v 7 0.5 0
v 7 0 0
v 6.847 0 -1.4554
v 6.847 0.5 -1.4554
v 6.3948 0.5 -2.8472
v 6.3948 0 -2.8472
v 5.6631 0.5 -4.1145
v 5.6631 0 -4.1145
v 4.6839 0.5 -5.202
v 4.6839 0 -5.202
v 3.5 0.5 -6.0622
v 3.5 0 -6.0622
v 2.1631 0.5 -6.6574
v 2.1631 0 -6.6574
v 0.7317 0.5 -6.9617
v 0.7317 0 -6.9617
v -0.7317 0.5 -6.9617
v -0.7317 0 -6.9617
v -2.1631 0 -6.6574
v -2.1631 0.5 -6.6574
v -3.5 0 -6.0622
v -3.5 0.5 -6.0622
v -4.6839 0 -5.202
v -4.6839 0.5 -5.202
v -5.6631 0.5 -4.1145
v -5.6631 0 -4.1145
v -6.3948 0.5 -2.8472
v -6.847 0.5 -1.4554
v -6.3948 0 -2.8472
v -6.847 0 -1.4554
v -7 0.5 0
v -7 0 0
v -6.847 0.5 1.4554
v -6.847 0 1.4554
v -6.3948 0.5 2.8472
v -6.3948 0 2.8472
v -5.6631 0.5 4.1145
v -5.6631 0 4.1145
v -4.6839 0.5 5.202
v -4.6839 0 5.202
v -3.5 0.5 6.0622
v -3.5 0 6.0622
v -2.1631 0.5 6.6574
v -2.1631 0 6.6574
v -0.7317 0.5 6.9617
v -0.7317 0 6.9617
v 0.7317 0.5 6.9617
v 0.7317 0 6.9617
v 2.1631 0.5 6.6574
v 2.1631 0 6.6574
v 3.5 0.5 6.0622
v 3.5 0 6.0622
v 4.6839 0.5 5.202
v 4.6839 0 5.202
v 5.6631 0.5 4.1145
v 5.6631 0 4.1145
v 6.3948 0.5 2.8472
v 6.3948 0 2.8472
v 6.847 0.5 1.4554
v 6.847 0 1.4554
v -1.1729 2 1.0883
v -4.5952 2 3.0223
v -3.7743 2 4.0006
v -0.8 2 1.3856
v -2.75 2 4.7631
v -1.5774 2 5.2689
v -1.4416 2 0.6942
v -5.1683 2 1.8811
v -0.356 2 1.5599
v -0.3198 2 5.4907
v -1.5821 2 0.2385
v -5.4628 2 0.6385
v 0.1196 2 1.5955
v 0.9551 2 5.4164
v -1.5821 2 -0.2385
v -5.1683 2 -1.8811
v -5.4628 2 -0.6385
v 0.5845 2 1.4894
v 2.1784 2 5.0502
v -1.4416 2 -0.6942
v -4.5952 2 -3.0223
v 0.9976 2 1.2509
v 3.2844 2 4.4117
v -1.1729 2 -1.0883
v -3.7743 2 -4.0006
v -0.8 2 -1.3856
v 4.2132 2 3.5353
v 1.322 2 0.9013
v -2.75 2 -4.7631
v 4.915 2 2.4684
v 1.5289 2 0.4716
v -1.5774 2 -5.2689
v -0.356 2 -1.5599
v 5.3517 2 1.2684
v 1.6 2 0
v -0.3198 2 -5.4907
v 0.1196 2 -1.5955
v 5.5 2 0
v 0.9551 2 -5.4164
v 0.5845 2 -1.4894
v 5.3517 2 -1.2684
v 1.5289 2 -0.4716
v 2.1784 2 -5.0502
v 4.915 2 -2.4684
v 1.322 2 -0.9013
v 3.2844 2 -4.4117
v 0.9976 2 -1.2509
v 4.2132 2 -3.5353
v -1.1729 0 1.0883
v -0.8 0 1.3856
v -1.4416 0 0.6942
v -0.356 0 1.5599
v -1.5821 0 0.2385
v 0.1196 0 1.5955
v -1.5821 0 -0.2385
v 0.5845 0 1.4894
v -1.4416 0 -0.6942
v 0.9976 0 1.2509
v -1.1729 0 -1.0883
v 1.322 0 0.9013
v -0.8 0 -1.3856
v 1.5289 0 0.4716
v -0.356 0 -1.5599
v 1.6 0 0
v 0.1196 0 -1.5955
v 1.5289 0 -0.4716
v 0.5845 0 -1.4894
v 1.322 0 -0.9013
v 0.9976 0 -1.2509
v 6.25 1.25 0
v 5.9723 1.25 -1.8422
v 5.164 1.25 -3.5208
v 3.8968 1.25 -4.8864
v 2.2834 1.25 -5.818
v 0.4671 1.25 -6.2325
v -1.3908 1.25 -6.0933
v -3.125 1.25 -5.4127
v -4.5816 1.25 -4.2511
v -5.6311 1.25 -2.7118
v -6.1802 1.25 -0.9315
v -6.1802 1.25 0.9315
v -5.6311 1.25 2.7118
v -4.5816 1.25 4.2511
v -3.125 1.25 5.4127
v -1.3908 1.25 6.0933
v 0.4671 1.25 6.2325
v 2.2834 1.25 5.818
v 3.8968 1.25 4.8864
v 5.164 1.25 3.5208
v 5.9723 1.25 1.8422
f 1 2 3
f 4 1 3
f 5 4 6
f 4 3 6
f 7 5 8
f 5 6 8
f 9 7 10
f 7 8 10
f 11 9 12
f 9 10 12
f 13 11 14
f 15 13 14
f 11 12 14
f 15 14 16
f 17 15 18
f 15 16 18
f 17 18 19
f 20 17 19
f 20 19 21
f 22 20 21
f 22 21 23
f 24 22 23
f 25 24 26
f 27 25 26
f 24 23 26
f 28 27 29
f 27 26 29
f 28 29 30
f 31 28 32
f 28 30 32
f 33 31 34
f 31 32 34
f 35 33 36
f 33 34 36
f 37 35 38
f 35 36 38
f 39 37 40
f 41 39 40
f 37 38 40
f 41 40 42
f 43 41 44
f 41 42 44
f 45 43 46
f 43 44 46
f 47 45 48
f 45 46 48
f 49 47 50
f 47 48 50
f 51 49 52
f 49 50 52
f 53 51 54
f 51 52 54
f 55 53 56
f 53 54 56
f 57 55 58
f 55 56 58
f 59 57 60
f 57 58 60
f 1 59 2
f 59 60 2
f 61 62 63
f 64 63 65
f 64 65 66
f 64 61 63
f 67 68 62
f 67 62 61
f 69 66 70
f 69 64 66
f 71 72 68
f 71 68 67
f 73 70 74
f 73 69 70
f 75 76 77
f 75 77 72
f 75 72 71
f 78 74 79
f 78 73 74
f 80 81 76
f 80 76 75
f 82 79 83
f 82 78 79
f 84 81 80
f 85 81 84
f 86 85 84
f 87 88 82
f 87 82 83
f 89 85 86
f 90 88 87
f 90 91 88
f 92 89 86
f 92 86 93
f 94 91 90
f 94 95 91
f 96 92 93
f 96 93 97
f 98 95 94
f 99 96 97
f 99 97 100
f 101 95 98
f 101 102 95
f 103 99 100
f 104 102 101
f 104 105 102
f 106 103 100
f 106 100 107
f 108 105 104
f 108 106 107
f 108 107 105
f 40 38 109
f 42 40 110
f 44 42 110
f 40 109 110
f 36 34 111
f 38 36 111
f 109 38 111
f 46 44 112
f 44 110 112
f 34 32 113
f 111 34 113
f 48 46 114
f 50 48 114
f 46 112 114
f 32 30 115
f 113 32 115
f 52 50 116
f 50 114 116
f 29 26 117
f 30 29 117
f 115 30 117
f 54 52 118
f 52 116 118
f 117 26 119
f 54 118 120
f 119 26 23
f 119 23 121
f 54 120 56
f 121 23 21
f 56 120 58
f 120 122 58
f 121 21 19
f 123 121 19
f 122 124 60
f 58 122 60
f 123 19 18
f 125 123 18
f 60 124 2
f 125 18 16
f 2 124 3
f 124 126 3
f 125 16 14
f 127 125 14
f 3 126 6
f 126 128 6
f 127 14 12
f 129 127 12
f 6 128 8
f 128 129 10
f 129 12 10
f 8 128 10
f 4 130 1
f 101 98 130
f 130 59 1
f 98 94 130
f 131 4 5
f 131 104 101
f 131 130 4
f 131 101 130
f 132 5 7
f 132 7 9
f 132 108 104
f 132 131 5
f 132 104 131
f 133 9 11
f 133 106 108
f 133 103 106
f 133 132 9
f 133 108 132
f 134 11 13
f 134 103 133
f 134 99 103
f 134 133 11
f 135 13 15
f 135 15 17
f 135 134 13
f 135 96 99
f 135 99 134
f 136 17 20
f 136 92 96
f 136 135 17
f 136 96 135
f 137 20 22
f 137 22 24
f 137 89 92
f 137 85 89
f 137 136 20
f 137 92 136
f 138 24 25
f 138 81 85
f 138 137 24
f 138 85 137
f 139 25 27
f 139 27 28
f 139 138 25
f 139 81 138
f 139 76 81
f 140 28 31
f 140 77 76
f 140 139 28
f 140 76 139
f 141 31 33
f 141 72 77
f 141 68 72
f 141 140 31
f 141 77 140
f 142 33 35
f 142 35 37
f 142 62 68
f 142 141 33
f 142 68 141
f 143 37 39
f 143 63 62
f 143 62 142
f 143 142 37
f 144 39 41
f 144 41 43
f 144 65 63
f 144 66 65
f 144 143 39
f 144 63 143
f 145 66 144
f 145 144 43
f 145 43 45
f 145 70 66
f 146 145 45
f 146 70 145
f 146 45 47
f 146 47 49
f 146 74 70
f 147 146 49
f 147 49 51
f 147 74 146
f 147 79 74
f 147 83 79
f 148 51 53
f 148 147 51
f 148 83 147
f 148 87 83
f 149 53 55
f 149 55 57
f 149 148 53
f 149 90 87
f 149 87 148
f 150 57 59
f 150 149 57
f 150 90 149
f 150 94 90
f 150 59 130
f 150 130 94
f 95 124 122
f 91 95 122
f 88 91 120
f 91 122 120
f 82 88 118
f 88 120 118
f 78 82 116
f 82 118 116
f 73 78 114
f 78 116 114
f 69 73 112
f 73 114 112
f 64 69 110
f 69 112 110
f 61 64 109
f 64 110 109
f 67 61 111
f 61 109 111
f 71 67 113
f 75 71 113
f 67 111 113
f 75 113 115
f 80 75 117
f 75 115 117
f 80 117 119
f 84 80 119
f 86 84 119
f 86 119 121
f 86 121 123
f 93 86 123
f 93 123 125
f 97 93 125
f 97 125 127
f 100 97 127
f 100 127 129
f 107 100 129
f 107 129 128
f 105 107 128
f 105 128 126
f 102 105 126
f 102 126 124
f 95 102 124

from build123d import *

# Parameters (mm, degrees)
SKETCH_1_R          = 7
EXTRUDE_1_DEPTH     = 2
CHAMFER_1_SIZE      = 1.5
SKETCH_2_R          = 1.6
CUT_EXTRUDE_1_DEPTH = 3


with BuildPart() as part:
    # Эскиз1 → Бобышка-Вытянуть1 (new body)
    with BuildSketch(Plane(origin=(0, 0, 0), x_dir=(1, 0, 0), z_dir=(0, 1, 0))):
        Circle(SKETCH_1_R)
    extrude(amount=EXTRUDE_1_DEPTH)

    # Фаска1
    chamfer_1_edges = [part.edges().sort_by_distance(p)[0] for p in [
        (-7, 2, 0),
    ]]
    chamfer(chamfer_1_edges, length=CHAMFER_1_SIZE)

    # Эскиз2 → Вырез-Вытянуть1 (cut, through all)
    with BuildSketch(Plane.XZ):
        Circle(SKETCH_2_R)
    extrude(amount=-CUT_EXTRUDE_1_DEPTH, mode=Mode.SUBTRACT)


solid = part.part
